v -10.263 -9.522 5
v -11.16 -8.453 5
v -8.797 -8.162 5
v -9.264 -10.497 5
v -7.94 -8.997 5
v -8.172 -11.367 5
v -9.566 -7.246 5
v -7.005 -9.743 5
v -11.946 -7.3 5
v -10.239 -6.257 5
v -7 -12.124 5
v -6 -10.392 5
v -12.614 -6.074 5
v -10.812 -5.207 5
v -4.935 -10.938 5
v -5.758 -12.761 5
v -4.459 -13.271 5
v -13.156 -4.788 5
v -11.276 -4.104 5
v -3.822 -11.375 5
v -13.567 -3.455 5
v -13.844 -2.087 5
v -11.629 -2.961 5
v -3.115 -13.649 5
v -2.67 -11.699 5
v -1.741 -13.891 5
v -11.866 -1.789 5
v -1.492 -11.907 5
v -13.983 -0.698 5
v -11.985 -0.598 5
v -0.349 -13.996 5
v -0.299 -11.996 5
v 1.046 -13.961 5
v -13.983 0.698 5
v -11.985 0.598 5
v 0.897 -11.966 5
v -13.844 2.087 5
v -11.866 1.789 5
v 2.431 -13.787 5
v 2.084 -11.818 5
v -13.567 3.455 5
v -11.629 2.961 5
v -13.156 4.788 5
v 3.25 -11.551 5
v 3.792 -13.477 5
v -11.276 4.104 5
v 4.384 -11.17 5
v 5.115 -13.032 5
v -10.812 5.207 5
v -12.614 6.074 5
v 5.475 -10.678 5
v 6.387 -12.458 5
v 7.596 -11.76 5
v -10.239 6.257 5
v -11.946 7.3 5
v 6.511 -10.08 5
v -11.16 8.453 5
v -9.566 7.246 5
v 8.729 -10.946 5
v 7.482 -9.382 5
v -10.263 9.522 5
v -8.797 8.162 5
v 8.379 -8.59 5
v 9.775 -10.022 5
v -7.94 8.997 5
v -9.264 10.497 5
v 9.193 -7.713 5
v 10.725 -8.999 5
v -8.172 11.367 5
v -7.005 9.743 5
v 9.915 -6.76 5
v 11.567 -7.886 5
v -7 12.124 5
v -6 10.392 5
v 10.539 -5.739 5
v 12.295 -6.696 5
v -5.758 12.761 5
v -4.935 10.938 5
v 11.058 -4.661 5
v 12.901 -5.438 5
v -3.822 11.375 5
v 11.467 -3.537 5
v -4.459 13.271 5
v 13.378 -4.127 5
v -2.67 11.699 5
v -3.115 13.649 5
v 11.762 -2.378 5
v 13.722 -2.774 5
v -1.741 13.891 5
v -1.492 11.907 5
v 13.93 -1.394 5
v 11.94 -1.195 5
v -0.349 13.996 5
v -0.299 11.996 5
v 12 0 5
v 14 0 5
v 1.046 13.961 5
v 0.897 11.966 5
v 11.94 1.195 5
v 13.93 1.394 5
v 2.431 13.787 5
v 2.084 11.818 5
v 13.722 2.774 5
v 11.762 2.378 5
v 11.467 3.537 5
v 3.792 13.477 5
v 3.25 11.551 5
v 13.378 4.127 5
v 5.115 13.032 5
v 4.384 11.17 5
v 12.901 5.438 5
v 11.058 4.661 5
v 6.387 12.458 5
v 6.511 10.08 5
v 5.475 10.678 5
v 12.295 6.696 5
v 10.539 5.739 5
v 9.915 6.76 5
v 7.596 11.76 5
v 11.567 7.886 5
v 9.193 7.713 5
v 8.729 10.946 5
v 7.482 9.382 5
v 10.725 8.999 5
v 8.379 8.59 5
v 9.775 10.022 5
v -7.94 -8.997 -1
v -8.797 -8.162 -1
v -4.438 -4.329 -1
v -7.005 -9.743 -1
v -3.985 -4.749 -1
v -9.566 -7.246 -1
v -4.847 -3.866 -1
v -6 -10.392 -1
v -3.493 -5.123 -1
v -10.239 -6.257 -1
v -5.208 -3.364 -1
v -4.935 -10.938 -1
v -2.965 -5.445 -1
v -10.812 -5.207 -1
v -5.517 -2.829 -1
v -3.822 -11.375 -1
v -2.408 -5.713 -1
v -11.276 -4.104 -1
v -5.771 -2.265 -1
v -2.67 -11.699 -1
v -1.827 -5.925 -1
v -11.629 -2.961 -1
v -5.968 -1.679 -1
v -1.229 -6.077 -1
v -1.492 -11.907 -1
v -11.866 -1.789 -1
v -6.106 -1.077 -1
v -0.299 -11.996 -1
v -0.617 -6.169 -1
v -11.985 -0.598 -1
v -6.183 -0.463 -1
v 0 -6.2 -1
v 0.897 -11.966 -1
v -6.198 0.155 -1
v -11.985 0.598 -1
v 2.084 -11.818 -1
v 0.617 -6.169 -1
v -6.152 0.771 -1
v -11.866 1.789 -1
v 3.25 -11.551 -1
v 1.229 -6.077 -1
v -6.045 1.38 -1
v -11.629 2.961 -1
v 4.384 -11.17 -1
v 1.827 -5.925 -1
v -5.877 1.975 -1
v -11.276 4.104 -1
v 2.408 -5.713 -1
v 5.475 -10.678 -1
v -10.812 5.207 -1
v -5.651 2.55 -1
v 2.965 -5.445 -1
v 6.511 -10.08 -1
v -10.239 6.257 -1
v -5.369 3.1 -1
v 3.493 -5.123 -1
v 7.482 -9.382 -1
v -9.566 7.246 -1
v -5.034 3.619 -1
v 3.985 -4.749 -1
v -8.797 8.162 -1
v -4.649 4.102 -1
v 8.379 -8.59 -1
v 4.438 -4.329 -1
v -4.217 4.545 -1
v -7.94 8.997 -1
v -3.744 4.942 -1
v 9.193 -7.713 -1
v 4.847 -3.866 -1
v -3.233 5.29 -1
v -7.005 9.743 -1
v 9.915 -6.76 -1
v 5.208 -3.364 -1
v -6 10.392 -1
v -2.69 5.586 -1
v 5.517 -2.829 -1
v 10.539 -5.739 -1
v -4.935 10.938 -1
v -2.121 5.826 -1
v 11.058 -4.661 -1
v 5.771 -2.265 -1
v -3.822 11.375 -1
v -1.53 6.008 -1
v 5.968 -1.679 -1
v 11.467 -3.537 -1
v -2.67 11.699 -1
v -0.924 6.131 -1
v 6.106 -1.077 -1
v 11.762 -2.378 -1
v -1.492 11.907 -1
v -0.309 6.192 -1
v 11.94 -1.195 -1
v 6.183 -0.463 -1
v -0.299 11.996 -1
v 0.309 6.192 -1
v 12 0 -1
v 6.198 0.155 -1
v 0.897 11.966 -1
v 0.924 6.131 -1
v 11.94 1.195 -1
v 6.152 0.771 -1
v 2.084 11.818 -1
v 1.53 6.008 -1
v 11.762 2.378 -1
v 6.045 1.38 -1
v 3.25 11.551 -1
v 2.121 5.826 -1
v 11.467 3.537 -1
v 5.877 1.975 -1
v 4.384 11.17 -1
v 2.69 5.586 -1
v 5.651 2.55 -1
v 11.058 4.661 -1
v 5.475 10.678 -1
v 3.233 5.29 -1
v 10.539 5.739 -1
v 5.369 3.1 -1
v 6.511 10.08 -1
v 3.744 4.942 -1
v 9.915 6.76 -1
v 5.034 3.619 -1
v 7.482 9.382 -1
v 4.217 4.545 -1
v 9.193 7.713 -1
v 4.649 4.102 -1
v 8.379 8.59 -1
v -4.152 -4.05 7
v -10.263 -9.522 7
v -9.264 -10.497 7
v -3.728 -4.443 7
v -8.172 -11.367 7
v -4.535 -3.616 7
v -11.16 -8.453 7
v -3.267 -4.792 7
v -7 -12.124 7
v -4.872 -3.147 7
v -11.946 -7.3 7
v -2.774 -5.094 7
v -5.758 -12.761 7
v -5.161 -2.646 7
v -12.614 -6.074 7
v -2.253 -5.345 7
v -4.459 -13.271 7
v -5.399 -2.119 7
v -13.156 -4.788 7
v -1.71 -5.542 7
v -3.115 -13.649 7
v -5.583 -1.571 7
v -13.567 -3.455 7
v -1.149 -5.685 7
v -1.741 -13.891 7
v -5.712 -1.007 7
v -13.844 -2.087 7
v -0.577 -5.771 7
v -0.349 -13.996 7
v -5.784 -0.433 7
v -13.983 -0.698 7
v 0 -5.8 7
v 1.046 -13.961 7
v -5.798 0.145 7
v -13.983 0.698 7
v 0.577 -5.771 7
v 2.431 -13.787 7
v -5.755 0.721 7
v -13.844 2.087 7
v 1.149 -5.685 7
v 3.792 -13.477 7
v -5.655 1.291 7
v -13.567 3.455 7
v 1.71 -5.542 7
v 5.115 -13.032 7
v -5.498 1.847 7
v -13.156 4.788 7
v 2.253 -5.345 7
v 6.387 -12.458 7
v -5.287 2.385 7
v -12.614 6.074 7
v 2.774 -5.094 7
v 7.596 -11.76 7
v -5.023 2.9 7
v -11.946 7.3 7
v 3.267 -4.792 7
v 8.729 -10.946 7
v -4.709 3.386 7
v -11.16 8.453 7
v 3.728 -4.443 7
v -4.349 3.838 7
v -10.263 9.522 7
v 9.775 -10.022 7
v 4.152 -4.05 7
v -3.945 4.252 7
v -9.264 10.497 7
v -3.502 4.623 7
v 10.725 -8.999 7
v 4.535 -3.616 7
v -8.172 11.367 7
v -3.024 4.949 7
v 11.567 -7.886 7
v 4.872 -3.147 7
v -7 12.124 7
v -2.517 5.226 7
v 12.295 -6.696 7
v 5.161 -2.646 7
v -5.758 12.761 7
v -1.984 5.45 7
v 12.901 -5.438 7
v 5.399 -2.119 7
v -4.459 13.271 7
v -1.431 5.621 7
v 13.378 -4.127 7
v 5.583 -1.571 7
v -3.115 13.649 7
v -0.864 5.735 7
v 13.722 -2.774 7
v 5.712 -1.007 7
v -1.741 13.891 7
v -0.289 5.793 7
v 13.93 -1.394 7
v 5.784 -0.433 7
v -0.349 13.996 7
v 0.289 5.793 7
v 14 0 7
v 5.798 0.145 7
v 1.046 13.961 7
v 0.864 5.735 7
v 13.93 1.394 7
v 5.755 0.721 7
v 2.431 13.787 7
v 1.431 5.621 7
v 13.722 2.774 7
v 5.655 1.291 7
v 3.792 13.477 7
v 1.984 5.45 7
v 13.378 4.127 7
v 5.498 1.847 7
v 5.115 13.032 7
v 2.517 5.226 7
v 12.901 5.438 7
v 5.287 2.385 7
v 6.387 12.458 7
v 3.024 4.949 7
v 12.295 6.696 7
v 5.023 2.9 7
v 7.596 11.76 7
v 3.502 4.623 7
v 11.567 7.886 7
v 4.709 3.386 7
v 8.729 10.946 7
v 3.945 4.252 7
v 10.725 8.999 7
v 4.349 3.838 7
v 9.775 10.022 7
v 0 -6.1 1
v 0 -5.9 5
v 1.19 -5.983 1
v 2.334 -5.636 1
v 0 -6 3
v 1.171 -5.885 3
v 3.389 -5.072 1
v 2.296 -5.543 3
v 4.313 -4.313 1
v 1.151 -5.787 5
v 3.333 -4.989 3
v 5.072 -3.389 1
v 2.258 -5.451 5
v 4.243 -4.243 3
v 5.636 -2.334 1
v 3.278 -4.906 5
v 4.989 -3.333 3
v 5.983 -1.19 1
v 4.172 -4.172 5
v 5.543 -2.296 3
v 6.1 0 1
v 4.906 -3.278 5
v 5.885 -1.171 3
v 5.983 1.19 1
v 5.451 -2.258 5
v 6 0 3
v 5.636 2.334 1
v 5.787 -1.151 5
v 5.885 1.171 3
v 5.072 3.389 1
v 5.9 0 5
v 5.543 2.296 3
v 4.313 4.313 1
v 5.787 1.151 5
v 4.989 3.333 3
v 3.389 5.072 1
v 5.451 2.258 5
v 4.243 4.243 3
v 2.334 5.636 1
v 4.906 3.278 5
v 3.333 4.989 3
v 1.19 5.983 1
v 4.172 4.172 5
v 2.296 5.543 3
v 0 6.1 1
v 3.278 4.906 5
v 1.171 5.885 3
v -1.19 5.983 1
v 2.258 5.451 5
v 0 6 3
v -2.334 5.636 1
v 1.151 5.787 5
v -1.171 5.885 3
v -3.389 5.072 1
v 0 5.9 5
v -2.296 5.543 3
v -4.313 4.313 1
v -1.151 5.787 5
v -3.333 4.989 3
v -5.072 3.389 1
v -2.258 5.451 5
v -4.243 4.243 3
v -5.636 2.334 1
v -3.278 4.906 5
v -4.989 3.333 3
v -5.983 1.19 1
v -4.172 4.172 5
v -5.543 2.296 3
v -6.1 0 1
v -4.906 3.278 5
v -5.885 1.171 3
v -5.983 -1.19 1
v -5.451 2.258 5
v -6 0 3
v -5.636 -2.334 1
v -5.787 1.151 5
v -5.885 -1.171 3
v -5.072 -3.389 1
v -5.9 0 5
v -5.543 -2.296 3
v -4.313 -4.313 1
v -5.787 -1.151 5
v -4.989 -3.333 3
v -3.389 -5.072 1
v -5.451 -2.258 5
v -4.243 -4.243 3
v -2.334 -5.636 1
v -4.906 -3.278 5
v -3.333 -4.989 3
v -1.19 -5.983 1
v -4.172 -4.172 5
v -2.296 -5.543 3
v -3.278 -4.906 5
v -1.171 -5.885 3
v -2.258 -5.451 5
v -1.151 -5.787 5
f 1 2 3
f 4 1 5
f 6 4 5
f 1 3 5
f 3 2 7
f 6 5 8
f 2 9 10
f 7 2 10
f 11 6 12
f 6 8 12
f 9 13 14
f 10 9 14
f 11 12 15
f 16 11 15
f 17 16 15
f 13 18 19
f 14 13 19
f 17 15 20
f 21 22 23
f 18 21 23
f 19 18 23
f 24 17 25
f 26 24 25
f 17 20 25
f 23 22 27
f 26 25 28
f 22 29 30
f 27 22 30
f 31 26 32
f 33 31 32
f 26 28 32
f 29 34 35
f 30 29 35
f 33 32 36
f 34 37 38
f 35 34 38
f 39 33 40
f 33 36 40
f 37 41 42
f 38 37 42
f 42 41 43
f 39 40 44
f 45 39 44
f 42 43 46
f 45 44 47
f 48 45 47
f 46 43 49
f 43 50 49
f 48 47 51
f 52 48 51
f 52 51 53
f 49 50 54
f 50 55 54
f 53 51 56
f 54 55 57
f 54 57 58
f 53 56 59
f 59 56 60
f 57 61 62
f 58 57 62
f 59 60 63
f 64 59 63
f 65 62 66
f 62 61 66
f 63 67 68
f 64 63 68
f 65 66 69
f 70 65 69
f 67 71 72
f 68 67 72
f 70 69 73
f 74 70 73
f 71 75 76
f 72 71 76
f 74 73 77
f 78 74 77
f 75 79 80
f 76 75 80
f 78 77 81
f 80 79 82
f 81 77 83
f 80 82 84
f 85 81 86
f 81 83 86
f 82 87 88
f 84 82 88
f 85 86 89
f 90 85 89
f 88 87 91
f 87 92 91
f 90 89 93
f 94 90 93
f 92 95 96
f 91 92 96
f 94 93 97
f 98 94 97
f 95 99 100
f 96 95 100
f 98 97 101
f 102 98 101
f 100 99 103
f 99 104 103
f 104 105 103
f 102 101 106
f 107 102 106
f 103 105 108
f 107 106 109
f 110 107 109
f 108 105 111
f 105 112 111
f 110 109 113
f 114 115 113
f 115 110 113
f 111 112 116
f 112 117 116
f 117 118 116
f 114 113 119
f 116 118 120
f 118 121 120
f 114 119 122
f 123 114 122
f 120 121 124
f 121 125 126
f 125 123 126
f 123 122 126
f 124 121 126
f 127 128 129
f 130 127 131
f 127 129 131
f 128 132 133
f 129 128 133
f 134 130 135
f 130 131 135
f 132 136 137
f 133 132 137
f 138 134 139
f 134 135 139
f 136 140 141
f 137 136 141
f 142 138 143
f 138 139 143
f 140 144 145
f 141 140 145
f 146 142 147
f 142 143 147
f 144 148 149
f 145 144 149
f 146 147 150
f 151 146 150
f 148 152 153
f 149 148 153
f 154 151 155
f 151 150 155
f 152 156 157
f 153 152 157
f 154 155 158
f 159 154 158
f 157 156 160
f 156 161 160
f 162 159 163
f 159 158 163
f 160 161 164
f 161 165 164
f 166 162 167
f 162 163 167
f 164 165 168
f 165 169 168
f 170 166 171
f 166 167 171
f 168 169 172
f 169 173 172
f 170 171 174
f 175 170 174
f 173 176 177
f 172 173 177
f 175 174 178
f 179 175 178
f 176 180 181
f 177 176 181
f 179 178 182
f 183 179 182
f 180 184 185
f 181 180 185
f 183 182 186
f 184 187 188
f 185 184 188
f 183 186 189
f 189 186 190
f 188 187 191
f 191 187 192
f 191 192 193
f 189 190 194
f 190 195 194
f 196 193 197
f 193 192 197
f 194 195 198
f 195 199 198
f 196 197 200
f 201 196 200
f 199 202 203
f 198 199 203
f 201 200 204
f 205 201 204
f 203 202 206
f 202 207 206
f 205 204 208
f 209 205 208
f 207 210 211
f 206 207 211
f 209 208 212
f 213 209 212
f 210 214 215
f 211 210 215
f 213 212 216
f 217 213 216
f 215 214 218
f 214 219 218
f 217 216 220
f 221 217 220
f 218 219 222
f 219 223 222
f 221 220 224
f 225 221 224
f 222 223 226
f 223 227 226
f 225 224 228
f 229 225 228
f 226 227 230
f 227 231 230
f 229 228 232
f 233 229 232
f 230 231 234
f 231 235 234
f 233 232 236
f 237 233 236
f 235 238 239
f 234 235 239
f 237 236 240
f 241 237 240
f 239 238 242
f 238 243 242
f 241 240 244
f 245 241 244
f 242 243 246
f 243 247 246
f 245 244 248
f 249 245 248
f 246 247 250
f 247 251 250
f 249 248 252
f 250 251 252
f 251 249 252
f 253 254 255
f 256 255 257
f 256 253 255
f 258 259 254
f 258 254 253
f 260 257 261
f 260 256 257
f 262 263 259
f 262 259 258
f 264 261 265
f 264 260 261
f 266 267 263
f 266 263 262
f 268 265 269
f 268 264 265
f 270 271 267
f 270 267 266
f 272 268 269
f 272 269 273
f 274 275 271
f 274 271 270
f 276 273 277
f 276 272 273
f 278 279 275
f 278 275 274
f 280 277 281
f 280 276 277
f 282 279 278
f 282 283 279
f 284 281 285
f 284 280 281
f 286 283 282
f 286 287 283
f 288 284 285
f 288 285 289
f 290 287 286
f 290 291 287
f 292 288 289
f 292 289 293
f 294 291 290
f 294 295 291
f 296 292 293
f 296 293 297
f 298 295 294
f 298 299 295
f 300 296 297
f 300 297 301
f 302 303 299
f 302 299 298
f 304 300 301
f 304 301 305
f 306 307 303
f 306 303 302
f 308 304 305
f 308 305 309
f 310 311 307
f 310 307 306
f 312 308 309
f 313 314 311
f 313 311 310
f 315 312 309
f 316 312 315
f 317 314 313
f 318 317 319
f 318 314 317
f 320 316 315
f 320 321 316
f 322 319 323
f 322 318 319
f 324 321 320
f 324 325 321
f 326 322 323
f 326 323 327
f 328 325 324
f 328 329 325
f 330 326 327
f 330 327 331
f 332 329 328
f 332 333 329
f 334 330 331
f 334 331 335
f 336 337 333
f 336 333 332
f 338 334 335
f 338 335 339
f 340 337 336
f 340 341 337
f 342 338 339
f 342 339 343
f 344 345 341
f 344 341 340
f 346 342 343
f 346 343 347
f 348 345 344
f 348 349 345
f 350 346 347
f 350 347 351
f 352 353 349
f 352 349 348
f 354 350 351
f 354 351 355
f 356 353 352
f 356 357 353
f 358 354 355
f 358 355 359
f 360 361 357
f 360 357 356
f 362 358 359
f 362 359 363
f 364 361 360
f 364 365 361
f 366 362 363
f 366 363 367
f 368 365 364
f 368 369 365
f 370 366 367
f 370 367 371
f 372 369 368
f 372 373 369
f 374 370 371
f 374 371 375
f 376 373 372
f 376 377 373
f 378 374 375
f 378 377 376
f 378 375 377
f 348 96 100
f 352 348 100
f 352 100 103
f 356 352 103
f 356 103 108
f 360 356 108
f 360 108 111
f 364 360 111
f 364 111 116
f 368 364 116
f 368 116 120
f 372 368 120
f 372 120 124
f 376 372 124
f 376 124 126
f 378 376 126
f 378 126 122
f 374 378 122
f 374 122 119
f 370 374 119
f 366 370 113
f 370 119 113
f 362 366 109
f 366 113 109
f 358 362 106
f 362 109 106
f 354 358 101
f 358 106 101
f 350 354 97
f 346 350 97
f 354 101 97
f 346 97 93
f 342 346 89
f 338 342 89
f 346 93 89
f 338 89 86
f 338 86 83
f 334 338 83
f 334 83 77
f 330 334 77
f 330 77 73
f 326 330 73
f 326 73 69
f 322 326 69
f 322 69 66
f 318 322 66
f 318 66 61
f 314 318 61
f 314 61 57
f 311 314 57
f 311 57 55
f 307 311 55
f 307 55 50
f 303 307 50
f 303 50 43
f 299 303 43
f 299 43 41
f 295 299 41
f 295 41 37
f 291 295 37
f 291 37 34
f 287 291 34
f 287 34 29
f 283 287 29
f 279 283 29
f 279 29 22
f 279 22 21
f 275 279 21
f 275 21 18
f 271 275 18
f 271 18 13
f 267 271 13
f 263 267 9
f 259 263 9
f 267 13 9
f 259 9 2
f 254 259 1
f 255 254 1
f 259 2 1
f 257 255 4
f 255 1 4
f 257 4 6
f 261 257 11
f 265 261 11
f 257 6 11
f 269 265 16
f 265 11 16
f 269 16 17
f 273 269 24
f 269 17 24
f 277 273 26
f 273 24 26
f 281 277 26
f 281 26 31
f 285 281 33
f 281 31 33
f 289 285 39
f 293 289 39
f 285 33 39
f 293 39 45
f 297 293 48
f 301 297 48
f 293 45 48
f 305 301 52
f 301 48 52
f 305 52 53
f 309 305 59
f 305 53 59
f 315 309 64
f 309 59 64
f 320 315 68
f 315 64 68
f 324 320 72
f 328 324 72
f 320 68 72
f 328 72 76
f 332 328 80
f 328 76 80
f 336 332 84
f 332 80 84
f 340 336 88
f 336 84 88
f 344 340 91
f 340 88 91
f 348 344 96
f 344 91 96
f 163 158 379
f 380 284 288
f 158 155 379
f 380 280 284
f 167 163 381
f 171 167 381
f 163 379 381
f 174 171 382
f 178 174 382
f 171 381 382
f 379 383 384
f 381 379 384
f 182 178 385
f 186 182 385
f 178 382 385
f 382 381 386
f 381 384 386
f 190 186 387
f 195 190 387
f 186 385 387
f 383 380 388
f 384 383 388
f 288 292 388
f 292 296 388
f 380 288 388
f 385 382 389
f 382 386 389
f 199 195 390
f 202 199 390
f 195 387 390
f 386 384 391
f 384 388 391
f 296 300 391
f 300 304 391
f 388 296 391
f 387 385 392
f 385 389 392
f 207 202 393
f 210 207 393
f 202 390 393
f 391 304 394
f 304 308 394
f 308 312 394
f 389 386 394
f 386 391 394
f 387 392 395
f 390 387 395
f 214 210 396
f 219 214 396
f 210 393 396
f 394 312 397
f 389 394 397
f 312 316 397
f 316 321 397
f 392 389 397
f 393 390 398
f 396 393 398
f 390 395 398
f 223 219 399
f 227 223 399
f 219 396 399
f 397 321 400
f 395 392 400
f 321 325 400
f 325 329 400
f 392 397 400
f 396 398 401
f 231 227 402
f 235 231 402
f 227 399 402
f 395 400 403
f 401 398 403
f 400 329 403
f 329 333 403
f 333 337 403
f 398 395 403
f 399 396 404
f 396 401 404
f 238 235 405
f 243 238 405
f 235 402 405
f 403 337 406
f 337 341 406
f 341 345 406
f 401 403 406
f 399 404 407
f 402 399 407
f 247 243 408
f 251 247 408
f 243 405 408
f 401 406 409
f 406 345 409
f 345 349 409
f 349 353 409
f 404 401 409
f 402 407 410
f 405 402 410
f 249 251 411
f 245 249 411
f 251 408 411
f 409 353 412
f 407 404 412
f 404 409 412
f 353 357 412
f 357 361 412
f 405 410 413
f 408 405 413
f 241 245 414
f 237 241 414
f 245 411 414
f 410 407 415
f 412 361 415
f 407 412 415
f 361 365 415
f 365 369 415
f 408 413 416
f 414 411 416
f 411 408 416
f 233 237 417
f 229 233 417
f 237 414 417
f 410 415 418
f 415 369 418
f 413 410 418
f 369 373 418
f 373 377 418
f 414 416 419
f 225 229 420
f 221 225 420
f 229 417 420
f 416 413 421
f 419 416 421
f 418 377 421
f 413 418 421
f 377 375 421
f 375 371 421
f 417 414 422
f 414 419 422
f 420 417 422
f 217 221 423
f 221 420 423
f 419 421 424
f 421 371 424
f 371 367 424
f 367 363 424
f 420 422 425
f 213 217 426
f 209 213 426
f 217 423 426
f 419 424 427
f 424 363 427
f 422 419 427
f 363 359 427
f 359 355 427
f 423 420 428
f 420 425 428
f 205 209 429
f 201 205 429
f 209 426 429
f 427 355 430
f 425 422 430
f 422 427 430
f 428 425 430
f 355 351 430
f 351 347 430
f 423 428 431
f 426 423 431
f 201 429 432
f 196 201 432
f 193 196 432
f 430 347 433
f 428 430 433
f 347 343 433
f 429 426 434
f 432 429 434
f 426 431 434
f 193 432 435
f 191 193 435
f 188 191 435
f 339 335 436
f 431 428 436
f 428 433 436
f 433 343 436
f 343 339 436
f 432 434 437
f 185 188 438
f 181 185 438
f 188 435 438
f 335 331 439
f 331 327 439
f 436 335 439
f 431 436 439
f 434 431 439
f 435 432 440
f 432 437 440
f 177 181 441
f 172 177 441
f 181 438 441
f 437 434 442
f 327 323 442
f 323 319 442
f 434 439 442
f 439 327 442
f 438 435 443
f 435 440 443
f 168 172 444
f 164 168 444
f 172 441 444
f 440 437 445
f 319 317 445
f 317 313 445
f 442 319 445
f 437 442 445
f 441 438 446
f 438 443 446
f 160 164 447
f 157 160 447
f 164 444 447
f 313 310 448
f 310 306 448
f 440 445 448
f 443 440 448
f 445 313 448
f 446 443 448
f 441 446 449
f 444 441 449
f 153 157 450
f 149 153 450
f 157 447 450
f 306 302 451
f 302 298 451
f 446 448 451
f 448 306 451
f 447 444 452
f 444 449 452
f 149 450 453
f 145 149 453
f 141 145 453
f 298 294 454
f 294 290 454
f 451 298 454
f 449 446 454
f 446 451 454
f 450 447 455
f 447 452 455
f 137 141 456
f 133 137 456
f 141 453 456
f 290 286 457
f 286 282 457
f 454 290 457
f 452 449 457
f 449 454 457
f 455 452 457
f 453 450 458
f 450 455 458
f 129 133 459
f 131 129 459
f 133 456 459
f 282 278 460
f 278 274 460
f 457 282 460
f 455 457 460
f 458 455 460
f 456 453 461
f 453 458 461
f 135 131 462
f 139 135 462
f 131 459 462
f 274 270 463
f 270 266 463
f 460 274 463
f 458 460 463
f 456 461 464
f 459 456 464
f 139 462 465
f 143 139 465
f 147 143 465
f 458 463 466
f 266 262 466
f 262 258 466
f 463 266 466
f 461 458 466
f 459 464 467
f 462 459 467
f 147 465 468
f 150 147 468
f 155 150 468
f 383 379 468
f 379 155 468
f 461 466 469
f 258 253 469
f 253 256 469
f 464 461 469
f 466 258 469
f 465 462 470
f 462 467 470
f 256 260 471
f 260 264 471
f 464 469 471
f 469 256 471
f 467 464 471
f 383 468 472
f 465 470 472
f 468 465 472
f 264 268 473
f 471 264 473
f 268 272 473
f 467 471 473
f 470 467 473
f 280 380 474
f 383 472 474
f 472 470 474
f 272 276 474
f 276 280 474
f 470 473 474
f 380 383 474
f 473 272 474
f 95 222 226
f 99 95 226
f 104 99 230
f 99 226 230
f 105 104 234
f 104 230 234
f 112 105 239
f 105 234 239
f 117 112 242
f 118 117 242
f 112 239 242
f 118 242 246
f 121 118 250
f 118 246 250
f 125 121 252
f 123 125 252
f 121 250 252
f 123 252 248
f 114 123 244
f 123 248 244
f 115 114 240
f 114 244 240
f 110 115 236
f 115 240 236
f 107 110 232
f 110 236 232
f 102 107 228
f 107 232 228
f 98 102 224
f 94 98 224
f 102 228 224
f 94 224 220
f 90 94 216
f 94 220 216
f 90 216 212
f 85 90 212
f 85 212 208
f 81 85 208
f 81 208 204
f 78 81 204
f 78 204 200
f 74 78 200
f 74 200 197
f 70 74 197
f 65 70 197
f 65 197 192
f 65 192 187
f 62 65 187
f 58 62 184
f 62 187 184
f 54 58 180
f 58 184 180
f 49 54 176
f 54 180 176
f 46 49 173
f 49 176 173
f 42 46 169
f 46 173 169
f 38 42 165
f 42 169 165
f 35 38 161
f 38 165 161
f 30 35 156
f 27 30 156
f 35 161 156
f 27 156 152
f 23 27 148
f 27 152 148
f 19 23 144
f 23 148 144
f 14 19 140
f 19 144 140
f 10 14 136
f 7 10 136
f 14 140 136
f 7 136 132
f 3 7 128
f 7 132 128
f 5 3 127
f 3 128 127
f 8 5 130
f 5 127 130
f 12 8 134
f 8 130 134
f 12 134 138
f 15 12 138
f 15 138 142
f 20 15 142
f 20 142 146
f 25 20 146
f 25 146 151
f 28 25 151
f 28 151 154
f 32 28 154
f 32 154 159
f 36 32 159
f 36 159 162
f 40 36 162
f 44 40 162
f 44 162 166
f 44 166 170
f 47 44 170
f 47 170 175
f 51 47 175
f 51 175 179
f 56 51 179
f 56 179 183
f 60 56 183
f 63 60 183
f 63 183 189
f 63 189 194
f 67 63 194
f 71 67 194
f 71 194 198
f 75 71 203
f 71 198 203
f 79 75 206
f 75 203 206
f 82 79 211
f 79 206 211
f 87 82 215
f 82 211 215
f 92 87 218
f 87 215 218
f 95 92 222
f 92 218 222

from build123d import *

# Parameters (mm, degrees)
SKETCH010_R     = 14
PAD006_DEPTH    = 8
SKETCH011_R     = 14
SKETCH011_R_2   = 12
POCKET001_DEPTH = 6


with BuildPart() as part:
    # Sketch010 → Pad006 (new body)
    with BuildSketch(Plane.XY):
        Circle(SKETCH010_R)
    extrude(amount=PAD006_DEPTH)

    # Sketch011 → Pocket001 (cut)
    with BuildSketch(Plane.XY):
        Circle(SKETCH011_R)
        Circle(SKETCH011_R_2, mode=Mode.SUBTRACT)
    extrude(amount=POCKET001_DEPTH, mode=Mode.SUBTRACT)

    # Sketch012 → Groove002 (revolve, cut)
    with BuildSketch(Plane.YZ):
        Polygon((0, 0), (-6.2, 0), (-5.8, 8), (0, 8), align=None)
    revolve(axis=Axis((0, 0, 0), (0, 0, 1)), mode=Mode.SUBTRACT)


with BuildPart() as part_1:
    # Body003 placement: moved
    add(part.part.moved(Location((0, 0, -1))))


solid = part_1.part
